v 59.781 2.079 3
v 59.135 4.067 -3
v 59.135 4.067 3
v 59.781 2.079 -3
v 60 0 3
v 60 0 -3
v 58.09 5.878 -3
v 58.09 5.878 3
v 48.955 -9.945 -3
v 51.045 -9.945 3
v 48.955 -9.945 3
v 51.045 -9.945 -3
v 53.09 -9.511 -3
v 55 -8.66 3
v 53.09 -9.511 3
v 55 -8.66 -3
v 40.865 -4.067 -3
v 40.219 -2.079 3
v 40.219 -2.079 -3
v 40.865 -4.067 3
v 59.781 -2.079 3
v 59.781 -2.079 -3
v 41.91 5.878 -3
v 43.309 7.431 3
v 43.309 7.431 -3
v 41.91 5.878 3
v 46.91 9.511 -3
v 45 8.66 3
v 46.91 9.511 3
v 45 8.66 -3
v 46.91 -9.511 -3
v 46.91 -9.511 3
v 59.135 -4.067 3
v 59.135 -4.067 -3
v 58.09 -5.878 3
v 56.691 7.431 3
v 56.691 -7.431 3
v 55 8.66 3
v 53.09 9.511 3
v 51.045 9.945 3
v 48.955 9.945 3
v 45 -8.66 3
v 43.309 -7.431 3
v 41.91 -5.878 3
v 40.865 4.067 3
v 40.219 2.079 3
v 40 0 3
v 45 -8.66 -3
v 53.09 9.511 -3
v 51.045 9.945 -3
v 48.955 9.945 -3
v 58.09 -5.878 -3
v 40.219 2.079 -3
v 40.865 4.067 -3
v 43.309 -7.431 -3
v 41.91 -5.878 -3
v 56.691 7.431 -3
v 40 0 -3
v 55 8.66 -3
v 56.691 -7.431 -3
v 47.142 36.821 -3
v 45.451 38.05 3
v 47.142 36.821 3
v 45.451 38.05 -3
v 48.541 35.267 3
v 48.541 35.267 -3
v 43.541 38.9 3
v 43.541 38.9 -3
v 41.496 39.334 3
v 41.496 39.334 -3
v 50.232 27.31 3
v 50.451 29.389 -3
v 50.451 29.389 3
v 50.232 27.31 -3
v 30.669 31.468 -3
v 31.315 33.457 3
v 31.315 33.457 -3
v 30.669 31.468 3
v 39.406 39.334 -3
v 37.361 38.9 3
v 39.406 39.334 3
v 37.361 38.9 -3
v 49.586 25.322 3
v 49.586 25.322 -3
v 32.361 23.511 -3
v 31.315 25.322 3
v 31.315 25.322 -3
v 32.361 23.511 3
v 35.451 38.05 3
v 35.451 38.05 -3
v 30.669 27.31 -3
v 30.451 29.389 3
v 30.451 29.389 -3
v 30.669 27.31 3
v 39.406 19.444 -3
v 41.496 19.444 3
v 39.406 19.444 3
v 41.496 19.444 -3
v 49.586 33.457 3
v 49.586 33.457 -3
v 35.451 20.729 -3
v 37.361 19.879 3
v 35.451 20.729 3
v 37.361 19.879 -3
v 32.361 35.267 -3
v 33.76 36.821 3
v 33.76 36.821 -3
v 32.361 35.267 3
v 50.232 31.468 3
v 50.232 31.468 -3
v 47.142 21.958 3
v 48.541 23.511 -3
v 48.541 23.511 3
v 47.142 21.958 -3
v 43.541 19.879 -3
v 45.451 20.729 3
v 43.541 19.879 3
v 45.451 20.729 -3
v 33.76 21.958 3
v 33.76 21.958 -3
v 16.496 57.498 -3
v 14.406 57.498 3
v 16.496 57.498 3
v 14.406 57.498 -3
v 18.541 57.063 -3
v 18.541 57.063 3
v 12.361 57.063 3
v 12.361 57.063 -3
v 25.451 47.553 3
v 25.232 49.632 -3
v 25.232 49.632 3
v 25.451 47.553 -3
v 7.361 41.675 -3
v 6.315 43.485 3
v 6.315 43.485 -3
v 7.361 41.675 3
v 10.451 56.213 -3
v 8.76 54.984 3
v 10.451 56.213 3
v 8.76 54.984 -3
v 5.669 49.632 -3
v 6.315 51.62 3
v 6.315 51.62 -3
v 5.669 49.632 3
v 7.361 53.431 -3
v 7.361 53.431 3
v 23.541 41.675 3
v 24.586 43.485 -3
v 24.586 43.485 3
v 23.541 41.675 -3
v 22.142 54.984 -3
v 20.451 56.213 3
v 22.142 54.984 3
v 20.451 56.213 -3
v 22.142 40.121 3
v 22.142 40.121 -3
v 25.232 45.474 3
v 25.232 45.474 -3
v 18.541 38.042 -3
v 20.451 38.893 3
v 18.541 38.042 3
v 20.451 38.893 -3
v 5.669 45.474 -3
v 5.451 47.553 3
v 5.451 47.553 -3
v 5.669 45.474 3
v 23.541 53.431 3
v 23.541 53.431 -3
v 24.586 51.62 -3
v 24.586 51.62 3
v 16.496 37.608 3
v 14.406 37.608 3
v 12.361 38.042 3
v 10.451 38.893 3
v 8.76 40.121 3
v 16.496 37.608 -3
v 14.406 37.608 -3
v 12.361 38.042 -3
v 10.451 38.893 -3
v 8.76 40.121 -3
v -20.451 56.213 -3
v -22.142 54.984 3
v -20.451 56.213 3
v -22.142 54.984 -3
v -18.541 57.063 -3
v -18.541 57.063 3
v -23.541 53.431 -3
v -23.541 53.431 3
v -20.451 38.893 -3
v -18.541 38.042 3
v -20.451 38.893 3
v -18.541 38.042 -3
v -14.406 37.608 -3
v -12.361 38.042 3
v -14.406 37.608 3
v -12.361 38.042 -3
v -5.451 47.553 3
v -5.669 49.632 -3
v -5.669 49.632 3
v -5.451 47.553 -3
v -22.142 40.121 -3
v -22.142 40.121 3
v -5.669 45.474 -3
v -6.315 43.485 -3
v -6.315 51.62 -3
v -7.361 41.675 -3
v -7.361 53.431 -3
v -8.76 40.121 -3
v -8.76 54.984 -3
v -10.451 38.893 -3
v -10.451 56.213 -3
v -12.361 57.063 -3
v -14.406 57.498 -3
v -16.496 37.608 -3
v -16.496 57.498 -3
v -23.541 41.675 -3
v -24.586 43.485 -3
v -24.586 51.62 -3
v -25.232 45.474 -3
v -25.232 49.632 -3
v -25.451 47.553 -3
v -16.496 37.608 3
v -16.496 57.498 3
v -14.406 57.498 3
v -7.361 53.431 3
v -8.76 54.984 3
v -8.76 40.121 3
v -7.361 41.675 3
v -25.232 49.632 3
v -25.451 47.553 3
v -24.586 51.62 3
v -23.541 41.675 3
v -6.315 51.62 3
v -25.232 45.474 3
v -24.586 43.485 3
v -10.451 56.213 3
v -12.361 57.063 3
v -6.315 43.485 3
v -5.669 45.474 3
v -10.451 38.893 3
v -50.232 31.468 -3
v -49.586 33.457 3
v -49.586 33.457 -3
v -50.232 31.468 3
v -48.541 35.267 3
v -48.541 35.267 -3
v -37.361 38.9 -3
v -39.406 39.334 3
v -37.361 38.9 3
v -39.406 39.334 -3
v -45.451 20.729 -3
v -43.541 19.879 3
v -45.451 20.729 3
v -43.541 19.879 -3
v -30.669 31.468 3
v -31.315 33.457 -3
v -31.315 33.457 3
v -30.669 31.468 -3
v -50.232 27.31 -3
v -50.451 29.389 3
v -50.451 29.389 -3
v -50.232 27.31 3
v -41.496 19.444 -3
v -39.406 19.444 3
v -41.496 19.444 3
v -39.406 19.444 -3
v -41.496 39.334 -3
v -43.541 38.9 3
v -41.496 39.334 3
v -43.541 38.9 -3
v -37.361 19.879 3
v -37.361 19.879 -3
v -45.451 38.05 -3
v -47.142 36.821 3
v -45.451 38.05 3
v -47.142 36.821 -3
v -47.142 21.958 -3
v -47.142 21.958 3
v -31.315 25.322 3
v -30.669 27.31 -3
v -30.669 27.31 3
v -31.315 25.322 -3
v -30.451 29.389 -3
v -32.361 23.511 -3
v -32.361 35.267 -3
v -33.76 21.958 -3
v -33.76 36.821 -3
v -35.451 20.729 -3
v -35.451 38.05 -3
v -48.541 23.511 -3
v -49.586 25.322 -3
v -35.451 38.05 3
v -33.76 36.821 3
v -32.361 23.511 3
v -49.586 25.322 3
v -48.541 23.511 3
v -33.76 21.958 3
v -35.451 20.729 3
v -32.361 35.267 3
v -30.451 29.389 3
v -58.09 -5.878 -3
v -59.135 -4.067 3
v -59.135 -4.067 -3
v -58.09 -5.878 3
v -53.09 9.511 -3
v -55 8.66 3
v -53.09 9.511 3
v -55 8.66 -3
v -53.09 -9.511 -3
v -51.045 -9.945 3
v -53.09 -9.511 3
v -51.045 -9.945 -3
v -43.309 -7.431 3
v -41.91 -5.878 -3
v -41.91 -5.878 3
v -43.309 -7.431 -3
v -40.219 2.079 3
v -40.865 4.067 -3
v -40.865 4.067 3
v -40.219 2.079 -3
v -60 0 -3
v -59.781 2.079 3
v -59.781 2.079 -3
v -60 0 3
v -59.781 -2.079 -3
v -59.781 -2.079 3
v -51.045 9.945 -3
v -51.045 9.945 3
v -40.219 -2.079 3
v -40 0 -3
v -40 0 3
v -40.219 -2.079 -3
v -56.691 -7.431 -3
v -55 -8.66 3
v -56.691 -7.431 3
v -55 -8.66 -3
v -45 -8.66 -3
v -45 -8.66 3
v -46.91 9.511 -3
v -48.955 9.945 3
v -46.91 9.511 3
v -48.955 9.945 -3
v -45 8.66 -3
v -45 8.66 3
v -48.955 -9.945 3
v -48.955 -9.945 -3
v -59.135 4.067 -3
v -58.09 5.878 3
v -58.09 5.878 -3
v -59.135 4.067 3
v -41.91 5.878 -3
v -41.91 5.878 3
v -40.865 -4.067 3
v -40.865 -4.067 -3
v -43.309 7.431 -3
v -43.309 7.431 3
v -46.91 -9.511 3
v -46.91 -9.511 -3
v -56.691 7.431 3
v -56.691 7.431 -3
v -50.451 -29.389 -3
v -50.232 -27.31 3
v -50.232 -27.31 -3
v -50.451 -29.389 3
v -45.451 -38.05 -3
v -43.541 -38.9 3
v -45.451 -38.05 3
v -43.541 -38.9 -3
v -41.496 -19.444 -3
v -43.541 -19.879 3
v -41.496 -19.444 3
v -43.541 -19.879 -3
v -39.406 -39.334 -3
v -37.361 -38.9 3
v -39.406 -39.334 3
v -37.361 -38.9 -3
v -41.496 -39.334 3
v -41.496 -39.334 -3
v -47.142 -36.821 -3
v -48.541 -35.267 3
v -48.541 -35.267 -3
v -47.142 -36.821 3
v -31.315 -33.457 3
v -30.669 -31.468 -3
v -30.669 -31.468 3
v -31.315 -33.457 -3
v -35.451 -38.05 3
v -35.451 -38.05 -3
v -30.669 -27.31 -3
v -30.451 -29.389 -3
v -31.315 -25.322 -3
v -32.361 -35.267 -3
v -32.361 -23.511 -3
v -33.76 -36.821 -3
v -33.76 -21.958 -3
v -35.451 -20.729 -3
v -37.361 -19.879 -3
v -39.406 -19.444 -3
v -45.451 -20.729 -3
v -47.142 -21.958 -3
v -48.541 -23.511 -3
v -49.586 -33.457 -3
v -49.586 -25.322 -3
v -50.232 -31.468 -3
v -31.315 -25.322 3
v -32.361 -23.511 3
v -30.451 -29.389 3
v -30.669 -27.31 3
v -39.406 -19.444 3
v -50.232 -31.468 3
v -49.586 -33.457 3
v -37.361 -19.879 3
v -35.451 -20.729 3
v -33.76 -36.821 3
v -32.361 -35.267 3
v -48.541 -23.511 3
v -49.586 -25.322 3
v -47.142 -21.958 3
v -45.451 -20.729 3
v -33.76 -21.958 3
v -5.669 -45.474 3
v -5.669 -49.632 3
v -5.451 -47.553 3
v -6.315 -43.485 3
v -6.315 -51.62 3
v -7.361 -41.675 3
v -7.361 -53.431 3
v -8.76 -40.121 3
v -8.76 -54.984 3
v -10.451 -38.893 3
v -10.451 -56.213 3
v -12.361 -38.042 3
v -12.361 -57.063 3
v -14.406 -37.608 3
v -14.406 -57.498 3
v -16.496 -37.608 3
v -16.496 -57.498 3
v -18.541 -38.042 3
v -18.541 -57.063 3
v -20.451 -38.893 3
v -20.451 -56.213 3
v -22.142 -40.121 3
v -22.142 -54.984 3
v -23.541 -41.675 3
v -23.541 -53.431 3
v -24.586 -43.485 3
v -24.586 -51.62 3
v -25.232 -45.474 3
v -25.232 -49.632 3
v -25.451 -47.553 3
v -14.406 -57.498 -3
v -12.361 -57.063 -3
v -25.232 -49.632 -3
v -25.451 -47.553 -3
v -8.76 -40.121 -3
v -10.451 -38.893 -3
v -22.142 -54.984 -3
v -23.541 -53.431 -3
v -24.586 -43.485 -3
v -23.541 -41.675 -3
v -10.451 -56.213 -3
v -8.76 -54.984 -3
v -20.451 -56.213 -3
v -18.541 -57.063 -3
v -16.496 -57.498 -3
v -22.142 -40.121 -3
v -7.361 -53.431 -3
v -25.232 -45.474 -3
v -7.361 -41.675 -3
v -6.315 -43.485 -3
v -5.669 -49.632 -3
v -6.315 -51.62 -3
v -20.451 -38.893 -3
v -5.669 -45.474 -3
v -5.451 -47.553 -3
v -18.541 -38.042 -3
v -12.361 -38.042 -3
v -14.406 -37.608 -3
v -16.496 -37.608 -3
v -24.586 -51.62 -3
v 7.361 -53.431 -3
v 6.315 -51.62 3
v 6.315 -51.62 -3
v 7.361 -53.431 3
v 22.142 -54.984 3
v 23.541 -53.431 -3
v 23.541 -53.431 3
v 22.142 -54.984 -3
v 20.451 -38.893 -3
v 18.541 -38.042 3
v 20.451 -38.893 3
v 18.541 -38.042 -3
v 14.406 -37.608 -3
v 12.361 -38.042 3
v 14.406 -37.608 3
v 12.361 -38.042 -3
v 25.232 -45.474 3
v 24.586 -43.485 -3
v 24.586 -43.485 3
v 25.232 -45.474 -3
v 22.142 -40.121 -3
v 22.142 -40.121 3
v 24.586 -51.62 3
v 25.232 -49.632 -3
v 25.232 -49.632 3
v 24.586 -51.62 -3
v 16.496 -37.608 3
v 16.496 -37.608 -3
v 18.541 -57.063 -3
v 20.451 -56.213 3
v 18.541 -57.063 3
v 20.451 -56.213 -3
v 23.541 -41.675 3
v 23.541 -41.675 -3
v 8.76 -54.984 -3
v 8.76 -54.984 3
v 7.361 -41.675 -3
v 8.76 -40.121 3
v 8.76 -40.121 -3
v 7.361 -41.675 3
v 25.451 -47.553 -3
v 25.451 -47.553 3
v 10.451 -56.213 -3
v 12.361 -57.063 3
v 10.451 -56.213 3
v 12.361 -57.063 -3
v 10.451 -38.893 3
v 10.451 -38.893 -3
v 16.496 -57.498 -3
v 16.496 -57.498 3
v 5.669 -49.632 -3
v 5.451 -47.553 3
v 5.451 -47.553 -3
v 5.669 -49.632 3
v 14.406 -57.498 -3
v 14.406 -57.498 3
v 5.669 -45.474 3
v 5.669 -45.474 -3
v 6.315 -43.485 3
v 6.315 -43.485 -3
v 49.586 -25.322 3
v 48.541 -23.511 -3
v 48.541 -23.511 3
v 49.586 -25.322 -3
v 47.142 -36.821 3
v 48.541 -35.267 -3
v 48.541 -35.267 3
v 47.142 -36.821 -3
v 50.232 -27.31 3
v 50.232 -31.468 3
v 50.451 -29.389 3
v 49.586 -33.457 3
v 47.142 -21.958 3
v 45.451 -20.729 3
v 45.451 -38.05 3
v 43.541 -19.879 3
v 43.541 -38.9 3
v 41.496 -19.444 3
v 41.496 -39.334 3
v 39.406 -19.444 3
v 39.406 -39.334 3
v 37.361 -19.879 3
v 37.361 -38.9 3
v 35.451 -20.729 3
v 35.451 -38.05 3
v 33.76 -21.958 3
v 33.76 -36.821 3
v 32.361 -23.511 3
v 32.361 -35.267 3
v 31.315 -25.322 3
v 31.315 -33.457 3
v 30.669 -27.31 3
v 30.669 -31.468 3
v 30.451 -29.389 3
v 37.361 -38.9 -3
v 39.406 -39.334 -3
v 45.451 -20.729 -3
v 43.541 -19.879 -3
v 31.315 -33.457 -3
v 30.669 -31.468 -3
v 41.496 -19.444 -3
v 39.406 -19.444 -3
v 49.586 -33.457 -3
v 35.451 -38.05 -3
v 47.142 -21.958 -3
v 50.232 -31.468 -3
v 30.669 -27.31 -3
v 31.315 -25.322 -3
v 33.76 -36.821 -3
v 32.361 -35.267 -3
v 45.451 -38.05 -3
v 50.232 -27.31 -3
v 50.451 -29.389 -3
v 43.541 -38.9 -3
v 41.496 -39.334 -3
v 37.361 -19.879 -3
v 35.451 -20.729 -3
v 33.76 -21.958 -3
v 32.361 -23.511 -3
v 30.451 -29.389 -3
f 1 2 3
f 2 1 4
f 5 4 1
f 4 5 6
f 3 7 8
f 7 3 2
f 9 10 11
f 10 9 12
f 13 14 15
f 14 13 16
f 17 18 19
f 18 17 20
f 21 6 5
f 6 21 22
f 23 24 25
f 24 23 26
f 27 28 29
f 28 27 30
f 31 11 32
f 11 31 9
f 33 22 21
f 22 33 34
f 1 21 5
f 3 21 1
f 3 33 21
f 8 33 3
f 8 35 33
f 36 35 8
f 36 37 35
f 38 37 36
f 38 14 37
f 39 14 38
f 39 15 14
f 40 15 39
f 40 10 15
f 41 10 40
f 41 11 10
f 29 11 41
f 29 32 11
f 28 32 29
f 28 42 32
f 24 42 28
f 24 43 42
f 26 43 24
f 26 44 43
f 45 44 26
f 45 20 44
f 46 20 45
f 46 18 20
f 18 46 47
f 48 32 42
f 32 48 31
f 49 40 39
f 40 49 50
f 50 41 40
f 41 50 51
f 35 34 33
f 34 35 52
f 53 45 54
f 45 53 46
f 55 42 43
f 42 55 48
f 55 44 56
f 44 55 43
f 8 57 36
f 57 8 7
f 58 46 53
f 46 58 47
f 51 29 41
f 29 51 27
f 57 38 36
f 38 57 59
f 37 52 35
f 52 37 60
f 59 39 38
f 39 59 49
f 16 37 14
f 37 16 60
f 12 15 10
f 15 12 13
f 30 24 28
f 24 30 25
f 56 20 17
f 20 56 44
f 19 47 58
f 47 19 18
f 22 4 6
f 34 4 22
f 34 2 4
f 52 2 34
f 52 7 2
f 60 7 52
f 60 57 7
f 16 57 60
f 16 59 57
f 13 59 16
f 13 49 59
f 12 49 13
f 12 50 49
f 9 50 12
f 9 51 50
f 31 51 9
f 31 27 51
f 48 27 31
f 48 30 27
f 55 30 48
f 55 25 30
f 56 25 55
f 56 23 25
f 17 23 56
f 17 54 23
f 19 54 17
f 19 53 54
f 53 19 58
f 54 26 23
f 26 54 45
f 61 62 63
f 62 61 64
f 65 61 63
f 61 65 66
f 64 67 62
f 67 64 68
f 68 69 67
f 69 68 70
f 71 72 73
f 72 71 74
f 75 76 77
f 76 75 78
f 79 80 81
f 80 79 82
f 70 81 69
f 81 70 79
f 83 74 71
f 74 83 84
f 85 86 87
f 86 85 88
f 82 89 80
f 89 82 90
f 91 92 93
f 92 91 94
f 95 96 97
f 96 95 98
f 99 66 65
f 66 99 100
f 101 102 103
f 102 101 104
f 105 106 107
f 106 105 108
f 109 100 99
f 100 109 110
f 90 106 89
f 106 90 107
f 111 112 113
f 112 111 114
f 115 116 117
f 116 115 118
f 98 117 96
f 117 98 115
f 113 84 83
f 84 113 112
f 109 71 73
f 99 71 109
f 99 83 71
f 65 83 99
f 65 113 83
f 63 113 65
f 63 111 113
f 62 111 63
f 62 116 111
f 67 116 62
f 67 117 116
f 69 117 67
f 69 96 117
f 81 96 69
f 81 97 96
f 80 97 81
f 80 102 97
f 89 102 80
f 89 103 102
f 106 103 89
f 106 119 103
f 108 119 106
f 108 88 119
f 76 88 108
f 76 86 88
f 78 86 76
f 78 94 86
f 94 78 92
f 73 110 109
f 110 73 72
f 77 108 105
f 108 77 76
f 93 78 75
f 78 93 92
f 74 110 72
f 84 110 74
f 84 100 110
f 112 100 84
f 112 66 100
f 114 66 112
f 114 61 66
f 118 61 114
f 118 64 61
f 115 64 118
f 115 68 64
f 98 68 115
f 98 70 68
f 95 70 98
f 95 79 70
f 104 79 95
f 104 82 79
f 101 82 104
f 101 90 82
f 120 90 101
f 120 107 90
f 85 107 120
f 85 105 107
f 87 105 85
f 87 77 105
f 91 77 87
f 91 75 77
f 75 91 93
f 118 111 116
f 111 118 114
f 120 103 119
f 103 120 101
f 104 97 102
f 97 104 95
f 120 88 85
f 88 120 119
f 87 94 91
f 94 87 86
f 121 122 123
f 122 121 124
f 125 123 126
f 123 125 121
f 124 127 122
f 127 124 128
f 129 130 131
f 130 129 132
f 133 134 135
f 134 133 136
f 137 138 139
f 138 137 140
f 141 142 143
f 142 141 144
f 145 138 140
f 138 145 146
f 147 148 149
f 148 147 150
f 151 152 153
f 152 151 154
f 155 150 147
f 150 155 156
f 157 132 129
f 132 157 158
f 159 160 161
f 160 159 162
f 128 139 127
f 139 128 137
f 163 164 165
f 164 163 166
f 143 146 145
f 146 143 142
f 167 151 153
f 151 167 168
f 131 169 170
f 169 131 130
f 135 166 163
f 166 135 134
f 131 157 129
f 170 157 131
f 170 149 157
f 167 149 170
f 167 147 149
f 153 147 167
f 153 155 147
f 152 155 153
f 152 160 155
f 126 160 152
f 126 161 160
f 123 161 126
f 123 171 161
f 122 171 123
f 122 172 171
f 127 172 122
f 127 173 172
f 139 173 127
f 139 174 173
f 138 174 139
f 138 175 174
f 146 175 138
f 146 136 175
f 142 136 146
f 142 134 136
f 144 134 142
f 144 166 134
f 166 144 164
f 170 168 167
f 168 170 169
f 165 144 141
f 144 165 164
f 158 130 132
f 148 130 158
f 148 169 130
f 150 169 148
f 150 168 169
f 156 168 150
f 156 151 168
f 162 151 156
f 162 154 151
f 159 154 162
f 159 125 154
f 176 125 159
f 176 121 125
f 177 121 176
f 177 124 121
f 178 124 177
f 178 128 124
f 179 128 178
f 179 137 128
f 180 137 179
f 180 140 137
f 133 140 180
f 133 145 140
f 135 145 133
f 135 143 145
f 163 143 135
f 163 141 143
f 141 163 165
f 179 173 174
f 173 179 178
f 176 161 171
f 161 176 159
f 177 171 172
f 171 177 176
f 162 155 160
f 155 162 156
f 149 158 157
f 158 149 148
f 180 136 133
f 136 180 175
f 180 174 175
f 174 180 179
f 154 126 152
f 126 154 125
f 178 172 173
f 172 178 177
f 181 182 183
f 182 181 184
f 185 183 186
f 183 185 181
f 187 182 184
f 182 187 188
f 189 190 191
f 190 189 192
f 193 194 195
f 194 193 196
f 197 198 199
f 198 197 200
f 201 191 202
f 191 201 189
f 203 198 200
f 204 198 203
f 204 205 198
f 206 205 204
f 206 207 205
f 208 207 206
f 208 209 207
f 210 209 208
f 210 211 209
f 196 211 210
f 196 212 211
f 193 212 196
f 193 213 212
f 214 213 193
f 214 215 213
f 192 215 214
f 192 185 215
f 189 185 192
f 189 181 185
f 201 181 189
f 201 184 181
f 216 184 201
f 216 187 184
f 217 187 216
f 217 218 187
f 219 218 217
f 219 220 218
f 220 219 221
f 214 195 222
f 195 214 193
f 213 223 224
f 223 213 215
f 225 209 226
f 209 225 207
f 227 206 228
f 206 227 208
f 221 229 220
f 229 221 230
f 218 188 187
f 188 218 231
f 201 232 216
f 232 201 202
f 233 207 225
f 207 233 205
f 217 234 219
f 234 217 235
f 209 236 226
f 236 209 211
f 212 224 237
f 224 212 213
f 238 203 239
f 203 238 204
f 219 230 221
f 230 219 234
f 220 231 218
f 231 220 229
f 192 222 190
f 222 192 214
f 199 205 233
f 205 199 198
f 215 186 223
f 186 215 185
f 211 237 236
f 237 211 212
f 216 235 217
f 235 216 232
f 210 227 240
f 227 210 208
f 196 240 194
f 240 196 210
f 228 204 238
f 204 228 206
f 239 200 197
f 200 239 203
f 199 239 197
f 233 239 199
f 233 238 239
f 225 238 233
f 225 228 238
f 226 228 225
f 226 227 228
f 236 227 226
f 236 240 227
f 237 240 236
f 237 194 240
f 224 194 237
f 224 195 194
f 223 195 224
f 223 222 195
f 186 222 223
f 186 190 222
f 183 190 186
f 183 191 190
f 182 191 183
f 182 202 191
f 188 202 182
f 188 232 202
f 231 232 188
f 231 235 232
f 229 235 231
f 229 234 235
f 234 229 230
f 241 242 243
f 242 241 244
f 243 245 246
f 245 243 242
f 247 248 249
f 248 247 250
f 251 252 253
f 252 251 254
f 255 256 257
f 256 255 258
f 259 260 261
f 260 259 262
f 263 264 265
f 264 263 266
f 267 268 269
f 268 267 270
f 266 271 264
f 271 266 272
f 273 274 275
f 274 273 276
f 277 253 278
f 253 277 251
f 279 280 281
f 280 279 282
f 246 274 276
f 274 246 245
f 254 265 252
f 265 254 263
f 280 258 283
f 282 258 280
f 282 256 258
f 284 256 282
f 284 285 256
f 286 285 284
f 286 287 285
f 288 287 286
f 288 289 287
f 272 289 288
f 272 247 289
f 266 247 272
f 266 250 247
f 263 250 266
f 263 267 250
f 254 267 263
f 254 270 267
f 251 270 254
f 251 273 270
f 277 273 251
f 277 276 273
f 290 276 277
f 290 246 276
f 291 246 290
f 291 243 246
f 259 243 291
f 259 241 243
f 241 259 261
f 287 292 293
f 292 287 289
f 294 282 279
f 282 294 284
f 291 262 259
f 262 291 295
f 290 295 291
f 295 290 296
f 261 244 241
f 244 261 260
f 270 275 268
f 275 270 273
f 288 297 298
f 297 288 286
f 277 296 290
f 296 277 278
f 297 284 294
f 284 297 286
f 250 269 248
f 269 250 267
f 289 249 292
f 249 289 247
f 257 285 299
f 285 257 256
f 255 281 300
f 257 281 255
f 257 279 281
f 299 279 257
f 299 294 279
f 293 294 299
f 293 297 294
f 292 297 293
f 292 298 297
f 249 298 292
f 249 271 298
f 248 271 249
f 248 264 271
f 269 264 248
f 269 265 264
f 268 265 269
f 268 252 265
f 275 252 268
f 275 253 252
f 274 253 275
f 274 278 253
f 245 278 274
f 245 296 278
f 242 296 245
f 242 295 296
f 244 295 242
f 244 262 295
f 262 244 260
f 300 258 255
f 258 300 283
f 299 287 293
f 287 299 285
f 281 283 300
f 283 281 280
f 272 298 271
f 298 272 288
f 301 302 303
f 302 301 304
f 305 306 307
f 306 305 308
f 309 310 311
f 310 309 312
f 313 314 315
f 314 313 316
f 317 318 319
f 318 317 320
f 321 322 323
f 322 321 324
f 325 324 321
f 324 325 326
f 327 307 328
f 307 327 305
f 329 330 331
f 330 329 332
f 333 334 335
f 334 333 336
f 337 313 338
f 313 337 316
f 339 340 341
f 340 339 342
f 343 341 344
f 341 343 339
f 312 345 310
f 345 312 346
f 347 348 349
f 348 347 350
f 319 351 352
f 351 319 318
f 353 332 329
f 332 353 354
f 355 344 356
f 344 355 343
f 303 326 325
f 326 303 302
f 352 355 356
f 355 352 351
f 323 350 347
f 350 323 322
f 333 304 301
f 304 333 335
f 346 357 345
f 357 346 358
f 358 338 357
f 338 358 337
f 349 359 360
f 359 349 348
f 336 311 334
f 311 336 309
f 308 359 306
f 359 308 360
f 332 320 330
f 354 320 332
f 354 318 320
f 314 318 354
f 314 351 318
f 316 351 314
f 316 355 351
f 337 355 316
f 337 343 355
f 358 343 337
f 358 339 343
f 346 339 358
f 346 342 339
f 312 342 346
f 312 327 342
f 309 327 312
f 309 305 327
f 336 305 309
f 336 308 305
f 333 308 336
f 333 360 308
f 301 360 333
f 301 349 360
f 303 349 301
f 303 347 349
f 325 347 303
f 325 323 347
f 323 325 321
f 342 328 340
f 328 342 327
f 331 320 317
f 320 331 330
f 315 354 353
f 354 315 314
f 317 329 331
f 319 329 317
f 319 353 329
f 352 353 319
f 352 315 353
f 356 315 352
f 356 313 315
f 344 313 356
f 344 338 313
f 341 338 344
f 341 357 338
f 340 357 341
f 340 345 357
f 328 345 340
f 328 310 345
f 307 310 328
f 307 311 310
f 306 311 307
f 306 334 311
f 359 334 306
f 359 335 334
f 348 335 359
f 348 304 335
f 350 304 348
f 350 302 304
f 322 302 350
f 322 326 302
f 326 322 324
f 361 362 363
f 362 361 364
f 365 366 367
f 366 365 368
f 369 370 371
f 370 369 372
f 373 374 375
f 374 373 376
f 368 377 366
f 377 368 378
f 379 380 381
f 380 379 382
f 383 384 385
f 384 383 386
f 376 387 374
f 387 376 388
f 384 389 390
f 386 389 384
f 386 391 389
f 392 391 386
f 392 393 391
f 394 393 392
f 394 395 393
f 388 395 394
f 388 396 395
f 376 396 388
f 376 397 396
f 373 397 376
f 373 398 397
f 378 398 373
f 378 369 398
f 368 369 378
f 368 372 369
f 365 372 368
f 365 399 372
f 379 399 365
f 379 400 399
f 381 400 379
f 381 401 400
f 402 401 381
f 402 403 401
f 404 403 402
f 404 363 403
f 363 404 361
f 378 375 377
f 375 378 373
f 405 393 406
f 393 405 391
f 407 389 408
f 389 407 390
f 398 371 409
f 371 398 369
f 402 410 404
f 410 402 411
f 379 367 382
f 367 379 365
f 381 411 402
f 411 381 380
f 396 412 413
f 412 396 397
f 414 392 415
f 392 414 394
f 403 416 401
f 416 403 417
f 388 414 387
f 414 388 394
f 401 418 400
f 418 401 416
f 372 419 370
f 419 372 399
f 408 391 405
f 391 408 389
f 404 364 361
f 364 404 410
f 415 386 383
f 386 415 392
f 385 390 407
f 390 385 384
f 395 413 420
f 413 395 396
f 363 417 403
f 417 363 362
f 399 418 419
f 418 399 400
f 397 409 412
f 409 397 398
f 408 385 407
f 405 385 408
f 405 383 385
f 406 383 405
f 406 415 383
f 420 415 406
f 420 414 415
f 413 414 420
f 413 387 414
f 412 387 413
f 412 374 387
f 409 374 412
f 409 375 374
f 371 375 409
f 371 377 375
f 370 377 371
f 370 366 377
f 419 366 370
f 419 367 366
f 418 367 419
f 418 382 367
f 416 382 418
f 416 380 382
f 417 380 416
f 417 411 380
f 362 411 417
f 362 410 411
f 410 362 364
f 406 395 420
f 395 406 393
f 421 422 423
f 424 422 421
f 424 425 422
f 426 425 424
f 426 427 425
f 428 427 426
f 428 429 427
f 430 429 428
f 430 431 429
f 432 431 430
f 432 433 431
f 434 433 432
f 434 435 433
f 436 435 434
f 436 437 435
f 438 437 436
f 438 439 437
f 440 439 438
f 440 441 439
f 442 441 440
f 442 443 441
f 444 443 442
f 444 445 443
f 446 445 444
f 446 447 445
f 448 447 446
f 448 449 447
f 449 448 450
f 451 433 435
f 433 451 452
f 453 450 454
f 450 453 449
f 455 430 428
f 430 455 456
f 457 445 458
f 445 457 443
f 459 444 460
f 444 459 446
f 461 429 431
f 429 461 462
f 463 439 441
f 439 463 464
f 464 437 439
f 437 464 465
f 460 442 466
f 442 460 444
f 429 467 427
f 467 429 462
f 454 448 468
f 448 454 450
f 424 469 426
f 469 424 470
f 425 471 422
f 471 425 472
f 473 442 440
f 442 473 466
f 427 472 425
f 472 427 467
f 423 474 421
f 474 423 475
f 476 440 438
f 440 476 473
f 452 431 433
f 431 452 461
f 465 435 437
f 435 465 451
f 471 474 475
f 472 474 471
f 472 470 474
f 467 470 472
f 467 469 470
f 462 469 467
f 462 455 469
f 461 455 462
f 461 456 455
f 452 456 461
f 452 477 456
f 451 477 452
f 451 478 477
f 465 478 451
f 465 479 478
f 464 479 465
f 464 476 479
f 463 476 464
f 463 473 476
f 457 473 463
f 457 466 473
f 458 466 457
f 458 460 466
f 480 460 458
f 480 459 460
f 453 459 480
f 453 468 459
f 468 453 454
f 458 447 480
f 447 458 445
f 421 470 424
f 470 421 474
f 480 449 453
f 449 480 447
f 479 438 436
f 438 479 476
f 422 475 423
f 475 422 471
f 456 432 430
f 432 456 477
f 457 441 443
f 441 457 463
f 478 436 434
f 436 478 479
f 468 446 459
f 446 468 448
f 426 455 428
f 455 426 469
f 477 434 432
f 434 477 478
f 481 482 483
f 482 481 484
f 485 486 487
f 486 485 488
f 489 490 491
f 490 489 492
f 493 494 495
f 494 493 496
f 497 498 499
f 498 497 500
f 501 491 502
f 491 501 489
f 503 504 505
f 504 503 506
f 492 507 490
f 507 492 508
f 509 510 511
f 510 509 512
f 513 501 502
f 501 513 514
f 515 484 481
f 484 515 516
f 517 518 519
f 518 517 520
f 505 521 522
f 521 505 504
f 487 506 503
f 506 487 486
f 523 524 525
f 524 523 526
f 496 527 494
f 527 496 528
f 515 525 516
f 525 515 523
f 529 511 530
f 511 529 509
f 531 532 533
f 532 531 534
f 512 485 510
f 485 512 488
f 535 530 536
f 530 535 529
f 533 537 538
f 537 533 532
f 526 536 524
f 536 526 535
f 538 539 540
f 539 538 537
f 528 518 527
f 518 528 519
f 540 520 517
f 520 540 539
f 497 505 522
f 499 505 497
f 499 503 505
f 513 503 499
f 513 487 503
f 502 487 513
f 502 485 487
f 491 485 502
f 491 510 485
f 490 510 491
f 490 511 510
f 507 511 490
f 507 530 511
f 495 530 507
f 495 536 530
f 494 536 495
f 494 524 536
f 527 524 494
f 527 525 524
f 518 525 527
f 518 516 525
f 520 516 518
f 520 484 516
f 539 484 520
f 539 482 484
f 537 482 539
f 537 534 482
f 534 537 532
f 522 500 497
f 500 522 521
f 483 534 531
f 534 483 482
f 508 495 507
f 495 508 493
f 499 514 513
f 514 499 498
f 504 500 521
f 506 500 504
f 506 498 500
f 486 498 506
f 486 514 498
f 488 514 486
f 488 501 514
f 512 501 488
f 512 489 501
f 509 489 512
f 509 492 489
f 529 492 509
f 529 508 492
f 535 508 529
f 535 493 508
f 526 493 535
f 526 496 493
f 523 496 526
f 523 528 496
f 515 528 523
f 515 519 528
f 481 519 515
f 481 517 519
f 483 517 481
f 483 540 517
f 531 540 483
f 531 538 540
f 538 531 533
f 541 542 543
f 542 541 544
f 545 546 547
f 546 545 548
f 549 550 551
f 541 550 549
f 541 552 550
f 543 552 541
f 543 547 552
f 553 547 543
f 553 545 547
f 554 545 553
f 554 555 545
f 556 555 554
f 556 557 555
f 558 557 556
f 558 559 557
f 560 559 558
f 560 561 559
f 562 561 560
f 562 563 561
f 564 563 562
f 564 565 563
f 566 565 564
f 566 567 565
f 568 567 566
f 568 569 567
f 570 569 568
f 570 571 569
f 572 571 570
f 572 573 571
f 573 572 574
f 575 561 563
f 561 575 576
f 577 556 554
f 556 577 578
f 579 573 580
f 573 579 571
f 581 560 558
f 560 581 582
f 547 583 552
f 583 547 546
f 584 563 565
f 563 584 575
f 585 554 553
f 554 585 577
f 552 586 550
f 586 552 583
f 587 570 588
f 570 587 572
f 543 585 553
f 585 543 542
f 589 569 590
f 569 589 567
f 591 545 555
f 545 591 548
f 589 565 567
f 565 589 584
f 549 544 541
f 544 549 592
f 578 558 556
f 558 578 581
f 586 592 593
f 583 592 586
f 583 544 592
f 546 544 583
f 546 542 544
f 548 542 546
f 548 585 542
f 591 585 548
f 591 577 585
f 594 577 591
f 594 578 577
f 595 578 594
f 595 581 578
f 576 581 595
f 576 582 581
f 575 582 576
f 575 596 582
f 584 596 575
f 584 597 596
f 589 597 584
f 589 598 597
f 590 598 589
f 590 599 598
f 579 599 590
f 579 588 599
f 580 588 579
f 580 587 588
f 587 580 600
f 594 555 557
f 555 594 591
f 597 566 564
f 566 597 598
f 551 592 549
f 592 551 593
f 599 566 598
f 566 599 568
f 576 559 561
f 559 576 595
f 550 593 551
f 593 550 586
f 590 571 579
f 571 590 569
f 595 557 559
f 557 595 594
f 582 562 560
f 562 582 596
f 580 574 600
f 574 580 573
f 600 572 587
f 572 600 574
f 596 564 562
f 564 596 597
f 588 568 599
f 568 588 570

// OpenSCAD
// ring

petals = 10;

for (i = [0:petals-1]) {
    rotate([0, 0, 360 / petals * i]) {
        translate([50  , 0, 0])
          cylinder(h = 6, r = 10, center = true);
    }
}




// petals = 10;

// for (i = [0:petals-1]) {
//     rotate([0, 0, 360 / petals * i]) {
//         translate([20, 0, 0])
//           cylinder(h = 6, r = 10, center = true);
//     }
// }
